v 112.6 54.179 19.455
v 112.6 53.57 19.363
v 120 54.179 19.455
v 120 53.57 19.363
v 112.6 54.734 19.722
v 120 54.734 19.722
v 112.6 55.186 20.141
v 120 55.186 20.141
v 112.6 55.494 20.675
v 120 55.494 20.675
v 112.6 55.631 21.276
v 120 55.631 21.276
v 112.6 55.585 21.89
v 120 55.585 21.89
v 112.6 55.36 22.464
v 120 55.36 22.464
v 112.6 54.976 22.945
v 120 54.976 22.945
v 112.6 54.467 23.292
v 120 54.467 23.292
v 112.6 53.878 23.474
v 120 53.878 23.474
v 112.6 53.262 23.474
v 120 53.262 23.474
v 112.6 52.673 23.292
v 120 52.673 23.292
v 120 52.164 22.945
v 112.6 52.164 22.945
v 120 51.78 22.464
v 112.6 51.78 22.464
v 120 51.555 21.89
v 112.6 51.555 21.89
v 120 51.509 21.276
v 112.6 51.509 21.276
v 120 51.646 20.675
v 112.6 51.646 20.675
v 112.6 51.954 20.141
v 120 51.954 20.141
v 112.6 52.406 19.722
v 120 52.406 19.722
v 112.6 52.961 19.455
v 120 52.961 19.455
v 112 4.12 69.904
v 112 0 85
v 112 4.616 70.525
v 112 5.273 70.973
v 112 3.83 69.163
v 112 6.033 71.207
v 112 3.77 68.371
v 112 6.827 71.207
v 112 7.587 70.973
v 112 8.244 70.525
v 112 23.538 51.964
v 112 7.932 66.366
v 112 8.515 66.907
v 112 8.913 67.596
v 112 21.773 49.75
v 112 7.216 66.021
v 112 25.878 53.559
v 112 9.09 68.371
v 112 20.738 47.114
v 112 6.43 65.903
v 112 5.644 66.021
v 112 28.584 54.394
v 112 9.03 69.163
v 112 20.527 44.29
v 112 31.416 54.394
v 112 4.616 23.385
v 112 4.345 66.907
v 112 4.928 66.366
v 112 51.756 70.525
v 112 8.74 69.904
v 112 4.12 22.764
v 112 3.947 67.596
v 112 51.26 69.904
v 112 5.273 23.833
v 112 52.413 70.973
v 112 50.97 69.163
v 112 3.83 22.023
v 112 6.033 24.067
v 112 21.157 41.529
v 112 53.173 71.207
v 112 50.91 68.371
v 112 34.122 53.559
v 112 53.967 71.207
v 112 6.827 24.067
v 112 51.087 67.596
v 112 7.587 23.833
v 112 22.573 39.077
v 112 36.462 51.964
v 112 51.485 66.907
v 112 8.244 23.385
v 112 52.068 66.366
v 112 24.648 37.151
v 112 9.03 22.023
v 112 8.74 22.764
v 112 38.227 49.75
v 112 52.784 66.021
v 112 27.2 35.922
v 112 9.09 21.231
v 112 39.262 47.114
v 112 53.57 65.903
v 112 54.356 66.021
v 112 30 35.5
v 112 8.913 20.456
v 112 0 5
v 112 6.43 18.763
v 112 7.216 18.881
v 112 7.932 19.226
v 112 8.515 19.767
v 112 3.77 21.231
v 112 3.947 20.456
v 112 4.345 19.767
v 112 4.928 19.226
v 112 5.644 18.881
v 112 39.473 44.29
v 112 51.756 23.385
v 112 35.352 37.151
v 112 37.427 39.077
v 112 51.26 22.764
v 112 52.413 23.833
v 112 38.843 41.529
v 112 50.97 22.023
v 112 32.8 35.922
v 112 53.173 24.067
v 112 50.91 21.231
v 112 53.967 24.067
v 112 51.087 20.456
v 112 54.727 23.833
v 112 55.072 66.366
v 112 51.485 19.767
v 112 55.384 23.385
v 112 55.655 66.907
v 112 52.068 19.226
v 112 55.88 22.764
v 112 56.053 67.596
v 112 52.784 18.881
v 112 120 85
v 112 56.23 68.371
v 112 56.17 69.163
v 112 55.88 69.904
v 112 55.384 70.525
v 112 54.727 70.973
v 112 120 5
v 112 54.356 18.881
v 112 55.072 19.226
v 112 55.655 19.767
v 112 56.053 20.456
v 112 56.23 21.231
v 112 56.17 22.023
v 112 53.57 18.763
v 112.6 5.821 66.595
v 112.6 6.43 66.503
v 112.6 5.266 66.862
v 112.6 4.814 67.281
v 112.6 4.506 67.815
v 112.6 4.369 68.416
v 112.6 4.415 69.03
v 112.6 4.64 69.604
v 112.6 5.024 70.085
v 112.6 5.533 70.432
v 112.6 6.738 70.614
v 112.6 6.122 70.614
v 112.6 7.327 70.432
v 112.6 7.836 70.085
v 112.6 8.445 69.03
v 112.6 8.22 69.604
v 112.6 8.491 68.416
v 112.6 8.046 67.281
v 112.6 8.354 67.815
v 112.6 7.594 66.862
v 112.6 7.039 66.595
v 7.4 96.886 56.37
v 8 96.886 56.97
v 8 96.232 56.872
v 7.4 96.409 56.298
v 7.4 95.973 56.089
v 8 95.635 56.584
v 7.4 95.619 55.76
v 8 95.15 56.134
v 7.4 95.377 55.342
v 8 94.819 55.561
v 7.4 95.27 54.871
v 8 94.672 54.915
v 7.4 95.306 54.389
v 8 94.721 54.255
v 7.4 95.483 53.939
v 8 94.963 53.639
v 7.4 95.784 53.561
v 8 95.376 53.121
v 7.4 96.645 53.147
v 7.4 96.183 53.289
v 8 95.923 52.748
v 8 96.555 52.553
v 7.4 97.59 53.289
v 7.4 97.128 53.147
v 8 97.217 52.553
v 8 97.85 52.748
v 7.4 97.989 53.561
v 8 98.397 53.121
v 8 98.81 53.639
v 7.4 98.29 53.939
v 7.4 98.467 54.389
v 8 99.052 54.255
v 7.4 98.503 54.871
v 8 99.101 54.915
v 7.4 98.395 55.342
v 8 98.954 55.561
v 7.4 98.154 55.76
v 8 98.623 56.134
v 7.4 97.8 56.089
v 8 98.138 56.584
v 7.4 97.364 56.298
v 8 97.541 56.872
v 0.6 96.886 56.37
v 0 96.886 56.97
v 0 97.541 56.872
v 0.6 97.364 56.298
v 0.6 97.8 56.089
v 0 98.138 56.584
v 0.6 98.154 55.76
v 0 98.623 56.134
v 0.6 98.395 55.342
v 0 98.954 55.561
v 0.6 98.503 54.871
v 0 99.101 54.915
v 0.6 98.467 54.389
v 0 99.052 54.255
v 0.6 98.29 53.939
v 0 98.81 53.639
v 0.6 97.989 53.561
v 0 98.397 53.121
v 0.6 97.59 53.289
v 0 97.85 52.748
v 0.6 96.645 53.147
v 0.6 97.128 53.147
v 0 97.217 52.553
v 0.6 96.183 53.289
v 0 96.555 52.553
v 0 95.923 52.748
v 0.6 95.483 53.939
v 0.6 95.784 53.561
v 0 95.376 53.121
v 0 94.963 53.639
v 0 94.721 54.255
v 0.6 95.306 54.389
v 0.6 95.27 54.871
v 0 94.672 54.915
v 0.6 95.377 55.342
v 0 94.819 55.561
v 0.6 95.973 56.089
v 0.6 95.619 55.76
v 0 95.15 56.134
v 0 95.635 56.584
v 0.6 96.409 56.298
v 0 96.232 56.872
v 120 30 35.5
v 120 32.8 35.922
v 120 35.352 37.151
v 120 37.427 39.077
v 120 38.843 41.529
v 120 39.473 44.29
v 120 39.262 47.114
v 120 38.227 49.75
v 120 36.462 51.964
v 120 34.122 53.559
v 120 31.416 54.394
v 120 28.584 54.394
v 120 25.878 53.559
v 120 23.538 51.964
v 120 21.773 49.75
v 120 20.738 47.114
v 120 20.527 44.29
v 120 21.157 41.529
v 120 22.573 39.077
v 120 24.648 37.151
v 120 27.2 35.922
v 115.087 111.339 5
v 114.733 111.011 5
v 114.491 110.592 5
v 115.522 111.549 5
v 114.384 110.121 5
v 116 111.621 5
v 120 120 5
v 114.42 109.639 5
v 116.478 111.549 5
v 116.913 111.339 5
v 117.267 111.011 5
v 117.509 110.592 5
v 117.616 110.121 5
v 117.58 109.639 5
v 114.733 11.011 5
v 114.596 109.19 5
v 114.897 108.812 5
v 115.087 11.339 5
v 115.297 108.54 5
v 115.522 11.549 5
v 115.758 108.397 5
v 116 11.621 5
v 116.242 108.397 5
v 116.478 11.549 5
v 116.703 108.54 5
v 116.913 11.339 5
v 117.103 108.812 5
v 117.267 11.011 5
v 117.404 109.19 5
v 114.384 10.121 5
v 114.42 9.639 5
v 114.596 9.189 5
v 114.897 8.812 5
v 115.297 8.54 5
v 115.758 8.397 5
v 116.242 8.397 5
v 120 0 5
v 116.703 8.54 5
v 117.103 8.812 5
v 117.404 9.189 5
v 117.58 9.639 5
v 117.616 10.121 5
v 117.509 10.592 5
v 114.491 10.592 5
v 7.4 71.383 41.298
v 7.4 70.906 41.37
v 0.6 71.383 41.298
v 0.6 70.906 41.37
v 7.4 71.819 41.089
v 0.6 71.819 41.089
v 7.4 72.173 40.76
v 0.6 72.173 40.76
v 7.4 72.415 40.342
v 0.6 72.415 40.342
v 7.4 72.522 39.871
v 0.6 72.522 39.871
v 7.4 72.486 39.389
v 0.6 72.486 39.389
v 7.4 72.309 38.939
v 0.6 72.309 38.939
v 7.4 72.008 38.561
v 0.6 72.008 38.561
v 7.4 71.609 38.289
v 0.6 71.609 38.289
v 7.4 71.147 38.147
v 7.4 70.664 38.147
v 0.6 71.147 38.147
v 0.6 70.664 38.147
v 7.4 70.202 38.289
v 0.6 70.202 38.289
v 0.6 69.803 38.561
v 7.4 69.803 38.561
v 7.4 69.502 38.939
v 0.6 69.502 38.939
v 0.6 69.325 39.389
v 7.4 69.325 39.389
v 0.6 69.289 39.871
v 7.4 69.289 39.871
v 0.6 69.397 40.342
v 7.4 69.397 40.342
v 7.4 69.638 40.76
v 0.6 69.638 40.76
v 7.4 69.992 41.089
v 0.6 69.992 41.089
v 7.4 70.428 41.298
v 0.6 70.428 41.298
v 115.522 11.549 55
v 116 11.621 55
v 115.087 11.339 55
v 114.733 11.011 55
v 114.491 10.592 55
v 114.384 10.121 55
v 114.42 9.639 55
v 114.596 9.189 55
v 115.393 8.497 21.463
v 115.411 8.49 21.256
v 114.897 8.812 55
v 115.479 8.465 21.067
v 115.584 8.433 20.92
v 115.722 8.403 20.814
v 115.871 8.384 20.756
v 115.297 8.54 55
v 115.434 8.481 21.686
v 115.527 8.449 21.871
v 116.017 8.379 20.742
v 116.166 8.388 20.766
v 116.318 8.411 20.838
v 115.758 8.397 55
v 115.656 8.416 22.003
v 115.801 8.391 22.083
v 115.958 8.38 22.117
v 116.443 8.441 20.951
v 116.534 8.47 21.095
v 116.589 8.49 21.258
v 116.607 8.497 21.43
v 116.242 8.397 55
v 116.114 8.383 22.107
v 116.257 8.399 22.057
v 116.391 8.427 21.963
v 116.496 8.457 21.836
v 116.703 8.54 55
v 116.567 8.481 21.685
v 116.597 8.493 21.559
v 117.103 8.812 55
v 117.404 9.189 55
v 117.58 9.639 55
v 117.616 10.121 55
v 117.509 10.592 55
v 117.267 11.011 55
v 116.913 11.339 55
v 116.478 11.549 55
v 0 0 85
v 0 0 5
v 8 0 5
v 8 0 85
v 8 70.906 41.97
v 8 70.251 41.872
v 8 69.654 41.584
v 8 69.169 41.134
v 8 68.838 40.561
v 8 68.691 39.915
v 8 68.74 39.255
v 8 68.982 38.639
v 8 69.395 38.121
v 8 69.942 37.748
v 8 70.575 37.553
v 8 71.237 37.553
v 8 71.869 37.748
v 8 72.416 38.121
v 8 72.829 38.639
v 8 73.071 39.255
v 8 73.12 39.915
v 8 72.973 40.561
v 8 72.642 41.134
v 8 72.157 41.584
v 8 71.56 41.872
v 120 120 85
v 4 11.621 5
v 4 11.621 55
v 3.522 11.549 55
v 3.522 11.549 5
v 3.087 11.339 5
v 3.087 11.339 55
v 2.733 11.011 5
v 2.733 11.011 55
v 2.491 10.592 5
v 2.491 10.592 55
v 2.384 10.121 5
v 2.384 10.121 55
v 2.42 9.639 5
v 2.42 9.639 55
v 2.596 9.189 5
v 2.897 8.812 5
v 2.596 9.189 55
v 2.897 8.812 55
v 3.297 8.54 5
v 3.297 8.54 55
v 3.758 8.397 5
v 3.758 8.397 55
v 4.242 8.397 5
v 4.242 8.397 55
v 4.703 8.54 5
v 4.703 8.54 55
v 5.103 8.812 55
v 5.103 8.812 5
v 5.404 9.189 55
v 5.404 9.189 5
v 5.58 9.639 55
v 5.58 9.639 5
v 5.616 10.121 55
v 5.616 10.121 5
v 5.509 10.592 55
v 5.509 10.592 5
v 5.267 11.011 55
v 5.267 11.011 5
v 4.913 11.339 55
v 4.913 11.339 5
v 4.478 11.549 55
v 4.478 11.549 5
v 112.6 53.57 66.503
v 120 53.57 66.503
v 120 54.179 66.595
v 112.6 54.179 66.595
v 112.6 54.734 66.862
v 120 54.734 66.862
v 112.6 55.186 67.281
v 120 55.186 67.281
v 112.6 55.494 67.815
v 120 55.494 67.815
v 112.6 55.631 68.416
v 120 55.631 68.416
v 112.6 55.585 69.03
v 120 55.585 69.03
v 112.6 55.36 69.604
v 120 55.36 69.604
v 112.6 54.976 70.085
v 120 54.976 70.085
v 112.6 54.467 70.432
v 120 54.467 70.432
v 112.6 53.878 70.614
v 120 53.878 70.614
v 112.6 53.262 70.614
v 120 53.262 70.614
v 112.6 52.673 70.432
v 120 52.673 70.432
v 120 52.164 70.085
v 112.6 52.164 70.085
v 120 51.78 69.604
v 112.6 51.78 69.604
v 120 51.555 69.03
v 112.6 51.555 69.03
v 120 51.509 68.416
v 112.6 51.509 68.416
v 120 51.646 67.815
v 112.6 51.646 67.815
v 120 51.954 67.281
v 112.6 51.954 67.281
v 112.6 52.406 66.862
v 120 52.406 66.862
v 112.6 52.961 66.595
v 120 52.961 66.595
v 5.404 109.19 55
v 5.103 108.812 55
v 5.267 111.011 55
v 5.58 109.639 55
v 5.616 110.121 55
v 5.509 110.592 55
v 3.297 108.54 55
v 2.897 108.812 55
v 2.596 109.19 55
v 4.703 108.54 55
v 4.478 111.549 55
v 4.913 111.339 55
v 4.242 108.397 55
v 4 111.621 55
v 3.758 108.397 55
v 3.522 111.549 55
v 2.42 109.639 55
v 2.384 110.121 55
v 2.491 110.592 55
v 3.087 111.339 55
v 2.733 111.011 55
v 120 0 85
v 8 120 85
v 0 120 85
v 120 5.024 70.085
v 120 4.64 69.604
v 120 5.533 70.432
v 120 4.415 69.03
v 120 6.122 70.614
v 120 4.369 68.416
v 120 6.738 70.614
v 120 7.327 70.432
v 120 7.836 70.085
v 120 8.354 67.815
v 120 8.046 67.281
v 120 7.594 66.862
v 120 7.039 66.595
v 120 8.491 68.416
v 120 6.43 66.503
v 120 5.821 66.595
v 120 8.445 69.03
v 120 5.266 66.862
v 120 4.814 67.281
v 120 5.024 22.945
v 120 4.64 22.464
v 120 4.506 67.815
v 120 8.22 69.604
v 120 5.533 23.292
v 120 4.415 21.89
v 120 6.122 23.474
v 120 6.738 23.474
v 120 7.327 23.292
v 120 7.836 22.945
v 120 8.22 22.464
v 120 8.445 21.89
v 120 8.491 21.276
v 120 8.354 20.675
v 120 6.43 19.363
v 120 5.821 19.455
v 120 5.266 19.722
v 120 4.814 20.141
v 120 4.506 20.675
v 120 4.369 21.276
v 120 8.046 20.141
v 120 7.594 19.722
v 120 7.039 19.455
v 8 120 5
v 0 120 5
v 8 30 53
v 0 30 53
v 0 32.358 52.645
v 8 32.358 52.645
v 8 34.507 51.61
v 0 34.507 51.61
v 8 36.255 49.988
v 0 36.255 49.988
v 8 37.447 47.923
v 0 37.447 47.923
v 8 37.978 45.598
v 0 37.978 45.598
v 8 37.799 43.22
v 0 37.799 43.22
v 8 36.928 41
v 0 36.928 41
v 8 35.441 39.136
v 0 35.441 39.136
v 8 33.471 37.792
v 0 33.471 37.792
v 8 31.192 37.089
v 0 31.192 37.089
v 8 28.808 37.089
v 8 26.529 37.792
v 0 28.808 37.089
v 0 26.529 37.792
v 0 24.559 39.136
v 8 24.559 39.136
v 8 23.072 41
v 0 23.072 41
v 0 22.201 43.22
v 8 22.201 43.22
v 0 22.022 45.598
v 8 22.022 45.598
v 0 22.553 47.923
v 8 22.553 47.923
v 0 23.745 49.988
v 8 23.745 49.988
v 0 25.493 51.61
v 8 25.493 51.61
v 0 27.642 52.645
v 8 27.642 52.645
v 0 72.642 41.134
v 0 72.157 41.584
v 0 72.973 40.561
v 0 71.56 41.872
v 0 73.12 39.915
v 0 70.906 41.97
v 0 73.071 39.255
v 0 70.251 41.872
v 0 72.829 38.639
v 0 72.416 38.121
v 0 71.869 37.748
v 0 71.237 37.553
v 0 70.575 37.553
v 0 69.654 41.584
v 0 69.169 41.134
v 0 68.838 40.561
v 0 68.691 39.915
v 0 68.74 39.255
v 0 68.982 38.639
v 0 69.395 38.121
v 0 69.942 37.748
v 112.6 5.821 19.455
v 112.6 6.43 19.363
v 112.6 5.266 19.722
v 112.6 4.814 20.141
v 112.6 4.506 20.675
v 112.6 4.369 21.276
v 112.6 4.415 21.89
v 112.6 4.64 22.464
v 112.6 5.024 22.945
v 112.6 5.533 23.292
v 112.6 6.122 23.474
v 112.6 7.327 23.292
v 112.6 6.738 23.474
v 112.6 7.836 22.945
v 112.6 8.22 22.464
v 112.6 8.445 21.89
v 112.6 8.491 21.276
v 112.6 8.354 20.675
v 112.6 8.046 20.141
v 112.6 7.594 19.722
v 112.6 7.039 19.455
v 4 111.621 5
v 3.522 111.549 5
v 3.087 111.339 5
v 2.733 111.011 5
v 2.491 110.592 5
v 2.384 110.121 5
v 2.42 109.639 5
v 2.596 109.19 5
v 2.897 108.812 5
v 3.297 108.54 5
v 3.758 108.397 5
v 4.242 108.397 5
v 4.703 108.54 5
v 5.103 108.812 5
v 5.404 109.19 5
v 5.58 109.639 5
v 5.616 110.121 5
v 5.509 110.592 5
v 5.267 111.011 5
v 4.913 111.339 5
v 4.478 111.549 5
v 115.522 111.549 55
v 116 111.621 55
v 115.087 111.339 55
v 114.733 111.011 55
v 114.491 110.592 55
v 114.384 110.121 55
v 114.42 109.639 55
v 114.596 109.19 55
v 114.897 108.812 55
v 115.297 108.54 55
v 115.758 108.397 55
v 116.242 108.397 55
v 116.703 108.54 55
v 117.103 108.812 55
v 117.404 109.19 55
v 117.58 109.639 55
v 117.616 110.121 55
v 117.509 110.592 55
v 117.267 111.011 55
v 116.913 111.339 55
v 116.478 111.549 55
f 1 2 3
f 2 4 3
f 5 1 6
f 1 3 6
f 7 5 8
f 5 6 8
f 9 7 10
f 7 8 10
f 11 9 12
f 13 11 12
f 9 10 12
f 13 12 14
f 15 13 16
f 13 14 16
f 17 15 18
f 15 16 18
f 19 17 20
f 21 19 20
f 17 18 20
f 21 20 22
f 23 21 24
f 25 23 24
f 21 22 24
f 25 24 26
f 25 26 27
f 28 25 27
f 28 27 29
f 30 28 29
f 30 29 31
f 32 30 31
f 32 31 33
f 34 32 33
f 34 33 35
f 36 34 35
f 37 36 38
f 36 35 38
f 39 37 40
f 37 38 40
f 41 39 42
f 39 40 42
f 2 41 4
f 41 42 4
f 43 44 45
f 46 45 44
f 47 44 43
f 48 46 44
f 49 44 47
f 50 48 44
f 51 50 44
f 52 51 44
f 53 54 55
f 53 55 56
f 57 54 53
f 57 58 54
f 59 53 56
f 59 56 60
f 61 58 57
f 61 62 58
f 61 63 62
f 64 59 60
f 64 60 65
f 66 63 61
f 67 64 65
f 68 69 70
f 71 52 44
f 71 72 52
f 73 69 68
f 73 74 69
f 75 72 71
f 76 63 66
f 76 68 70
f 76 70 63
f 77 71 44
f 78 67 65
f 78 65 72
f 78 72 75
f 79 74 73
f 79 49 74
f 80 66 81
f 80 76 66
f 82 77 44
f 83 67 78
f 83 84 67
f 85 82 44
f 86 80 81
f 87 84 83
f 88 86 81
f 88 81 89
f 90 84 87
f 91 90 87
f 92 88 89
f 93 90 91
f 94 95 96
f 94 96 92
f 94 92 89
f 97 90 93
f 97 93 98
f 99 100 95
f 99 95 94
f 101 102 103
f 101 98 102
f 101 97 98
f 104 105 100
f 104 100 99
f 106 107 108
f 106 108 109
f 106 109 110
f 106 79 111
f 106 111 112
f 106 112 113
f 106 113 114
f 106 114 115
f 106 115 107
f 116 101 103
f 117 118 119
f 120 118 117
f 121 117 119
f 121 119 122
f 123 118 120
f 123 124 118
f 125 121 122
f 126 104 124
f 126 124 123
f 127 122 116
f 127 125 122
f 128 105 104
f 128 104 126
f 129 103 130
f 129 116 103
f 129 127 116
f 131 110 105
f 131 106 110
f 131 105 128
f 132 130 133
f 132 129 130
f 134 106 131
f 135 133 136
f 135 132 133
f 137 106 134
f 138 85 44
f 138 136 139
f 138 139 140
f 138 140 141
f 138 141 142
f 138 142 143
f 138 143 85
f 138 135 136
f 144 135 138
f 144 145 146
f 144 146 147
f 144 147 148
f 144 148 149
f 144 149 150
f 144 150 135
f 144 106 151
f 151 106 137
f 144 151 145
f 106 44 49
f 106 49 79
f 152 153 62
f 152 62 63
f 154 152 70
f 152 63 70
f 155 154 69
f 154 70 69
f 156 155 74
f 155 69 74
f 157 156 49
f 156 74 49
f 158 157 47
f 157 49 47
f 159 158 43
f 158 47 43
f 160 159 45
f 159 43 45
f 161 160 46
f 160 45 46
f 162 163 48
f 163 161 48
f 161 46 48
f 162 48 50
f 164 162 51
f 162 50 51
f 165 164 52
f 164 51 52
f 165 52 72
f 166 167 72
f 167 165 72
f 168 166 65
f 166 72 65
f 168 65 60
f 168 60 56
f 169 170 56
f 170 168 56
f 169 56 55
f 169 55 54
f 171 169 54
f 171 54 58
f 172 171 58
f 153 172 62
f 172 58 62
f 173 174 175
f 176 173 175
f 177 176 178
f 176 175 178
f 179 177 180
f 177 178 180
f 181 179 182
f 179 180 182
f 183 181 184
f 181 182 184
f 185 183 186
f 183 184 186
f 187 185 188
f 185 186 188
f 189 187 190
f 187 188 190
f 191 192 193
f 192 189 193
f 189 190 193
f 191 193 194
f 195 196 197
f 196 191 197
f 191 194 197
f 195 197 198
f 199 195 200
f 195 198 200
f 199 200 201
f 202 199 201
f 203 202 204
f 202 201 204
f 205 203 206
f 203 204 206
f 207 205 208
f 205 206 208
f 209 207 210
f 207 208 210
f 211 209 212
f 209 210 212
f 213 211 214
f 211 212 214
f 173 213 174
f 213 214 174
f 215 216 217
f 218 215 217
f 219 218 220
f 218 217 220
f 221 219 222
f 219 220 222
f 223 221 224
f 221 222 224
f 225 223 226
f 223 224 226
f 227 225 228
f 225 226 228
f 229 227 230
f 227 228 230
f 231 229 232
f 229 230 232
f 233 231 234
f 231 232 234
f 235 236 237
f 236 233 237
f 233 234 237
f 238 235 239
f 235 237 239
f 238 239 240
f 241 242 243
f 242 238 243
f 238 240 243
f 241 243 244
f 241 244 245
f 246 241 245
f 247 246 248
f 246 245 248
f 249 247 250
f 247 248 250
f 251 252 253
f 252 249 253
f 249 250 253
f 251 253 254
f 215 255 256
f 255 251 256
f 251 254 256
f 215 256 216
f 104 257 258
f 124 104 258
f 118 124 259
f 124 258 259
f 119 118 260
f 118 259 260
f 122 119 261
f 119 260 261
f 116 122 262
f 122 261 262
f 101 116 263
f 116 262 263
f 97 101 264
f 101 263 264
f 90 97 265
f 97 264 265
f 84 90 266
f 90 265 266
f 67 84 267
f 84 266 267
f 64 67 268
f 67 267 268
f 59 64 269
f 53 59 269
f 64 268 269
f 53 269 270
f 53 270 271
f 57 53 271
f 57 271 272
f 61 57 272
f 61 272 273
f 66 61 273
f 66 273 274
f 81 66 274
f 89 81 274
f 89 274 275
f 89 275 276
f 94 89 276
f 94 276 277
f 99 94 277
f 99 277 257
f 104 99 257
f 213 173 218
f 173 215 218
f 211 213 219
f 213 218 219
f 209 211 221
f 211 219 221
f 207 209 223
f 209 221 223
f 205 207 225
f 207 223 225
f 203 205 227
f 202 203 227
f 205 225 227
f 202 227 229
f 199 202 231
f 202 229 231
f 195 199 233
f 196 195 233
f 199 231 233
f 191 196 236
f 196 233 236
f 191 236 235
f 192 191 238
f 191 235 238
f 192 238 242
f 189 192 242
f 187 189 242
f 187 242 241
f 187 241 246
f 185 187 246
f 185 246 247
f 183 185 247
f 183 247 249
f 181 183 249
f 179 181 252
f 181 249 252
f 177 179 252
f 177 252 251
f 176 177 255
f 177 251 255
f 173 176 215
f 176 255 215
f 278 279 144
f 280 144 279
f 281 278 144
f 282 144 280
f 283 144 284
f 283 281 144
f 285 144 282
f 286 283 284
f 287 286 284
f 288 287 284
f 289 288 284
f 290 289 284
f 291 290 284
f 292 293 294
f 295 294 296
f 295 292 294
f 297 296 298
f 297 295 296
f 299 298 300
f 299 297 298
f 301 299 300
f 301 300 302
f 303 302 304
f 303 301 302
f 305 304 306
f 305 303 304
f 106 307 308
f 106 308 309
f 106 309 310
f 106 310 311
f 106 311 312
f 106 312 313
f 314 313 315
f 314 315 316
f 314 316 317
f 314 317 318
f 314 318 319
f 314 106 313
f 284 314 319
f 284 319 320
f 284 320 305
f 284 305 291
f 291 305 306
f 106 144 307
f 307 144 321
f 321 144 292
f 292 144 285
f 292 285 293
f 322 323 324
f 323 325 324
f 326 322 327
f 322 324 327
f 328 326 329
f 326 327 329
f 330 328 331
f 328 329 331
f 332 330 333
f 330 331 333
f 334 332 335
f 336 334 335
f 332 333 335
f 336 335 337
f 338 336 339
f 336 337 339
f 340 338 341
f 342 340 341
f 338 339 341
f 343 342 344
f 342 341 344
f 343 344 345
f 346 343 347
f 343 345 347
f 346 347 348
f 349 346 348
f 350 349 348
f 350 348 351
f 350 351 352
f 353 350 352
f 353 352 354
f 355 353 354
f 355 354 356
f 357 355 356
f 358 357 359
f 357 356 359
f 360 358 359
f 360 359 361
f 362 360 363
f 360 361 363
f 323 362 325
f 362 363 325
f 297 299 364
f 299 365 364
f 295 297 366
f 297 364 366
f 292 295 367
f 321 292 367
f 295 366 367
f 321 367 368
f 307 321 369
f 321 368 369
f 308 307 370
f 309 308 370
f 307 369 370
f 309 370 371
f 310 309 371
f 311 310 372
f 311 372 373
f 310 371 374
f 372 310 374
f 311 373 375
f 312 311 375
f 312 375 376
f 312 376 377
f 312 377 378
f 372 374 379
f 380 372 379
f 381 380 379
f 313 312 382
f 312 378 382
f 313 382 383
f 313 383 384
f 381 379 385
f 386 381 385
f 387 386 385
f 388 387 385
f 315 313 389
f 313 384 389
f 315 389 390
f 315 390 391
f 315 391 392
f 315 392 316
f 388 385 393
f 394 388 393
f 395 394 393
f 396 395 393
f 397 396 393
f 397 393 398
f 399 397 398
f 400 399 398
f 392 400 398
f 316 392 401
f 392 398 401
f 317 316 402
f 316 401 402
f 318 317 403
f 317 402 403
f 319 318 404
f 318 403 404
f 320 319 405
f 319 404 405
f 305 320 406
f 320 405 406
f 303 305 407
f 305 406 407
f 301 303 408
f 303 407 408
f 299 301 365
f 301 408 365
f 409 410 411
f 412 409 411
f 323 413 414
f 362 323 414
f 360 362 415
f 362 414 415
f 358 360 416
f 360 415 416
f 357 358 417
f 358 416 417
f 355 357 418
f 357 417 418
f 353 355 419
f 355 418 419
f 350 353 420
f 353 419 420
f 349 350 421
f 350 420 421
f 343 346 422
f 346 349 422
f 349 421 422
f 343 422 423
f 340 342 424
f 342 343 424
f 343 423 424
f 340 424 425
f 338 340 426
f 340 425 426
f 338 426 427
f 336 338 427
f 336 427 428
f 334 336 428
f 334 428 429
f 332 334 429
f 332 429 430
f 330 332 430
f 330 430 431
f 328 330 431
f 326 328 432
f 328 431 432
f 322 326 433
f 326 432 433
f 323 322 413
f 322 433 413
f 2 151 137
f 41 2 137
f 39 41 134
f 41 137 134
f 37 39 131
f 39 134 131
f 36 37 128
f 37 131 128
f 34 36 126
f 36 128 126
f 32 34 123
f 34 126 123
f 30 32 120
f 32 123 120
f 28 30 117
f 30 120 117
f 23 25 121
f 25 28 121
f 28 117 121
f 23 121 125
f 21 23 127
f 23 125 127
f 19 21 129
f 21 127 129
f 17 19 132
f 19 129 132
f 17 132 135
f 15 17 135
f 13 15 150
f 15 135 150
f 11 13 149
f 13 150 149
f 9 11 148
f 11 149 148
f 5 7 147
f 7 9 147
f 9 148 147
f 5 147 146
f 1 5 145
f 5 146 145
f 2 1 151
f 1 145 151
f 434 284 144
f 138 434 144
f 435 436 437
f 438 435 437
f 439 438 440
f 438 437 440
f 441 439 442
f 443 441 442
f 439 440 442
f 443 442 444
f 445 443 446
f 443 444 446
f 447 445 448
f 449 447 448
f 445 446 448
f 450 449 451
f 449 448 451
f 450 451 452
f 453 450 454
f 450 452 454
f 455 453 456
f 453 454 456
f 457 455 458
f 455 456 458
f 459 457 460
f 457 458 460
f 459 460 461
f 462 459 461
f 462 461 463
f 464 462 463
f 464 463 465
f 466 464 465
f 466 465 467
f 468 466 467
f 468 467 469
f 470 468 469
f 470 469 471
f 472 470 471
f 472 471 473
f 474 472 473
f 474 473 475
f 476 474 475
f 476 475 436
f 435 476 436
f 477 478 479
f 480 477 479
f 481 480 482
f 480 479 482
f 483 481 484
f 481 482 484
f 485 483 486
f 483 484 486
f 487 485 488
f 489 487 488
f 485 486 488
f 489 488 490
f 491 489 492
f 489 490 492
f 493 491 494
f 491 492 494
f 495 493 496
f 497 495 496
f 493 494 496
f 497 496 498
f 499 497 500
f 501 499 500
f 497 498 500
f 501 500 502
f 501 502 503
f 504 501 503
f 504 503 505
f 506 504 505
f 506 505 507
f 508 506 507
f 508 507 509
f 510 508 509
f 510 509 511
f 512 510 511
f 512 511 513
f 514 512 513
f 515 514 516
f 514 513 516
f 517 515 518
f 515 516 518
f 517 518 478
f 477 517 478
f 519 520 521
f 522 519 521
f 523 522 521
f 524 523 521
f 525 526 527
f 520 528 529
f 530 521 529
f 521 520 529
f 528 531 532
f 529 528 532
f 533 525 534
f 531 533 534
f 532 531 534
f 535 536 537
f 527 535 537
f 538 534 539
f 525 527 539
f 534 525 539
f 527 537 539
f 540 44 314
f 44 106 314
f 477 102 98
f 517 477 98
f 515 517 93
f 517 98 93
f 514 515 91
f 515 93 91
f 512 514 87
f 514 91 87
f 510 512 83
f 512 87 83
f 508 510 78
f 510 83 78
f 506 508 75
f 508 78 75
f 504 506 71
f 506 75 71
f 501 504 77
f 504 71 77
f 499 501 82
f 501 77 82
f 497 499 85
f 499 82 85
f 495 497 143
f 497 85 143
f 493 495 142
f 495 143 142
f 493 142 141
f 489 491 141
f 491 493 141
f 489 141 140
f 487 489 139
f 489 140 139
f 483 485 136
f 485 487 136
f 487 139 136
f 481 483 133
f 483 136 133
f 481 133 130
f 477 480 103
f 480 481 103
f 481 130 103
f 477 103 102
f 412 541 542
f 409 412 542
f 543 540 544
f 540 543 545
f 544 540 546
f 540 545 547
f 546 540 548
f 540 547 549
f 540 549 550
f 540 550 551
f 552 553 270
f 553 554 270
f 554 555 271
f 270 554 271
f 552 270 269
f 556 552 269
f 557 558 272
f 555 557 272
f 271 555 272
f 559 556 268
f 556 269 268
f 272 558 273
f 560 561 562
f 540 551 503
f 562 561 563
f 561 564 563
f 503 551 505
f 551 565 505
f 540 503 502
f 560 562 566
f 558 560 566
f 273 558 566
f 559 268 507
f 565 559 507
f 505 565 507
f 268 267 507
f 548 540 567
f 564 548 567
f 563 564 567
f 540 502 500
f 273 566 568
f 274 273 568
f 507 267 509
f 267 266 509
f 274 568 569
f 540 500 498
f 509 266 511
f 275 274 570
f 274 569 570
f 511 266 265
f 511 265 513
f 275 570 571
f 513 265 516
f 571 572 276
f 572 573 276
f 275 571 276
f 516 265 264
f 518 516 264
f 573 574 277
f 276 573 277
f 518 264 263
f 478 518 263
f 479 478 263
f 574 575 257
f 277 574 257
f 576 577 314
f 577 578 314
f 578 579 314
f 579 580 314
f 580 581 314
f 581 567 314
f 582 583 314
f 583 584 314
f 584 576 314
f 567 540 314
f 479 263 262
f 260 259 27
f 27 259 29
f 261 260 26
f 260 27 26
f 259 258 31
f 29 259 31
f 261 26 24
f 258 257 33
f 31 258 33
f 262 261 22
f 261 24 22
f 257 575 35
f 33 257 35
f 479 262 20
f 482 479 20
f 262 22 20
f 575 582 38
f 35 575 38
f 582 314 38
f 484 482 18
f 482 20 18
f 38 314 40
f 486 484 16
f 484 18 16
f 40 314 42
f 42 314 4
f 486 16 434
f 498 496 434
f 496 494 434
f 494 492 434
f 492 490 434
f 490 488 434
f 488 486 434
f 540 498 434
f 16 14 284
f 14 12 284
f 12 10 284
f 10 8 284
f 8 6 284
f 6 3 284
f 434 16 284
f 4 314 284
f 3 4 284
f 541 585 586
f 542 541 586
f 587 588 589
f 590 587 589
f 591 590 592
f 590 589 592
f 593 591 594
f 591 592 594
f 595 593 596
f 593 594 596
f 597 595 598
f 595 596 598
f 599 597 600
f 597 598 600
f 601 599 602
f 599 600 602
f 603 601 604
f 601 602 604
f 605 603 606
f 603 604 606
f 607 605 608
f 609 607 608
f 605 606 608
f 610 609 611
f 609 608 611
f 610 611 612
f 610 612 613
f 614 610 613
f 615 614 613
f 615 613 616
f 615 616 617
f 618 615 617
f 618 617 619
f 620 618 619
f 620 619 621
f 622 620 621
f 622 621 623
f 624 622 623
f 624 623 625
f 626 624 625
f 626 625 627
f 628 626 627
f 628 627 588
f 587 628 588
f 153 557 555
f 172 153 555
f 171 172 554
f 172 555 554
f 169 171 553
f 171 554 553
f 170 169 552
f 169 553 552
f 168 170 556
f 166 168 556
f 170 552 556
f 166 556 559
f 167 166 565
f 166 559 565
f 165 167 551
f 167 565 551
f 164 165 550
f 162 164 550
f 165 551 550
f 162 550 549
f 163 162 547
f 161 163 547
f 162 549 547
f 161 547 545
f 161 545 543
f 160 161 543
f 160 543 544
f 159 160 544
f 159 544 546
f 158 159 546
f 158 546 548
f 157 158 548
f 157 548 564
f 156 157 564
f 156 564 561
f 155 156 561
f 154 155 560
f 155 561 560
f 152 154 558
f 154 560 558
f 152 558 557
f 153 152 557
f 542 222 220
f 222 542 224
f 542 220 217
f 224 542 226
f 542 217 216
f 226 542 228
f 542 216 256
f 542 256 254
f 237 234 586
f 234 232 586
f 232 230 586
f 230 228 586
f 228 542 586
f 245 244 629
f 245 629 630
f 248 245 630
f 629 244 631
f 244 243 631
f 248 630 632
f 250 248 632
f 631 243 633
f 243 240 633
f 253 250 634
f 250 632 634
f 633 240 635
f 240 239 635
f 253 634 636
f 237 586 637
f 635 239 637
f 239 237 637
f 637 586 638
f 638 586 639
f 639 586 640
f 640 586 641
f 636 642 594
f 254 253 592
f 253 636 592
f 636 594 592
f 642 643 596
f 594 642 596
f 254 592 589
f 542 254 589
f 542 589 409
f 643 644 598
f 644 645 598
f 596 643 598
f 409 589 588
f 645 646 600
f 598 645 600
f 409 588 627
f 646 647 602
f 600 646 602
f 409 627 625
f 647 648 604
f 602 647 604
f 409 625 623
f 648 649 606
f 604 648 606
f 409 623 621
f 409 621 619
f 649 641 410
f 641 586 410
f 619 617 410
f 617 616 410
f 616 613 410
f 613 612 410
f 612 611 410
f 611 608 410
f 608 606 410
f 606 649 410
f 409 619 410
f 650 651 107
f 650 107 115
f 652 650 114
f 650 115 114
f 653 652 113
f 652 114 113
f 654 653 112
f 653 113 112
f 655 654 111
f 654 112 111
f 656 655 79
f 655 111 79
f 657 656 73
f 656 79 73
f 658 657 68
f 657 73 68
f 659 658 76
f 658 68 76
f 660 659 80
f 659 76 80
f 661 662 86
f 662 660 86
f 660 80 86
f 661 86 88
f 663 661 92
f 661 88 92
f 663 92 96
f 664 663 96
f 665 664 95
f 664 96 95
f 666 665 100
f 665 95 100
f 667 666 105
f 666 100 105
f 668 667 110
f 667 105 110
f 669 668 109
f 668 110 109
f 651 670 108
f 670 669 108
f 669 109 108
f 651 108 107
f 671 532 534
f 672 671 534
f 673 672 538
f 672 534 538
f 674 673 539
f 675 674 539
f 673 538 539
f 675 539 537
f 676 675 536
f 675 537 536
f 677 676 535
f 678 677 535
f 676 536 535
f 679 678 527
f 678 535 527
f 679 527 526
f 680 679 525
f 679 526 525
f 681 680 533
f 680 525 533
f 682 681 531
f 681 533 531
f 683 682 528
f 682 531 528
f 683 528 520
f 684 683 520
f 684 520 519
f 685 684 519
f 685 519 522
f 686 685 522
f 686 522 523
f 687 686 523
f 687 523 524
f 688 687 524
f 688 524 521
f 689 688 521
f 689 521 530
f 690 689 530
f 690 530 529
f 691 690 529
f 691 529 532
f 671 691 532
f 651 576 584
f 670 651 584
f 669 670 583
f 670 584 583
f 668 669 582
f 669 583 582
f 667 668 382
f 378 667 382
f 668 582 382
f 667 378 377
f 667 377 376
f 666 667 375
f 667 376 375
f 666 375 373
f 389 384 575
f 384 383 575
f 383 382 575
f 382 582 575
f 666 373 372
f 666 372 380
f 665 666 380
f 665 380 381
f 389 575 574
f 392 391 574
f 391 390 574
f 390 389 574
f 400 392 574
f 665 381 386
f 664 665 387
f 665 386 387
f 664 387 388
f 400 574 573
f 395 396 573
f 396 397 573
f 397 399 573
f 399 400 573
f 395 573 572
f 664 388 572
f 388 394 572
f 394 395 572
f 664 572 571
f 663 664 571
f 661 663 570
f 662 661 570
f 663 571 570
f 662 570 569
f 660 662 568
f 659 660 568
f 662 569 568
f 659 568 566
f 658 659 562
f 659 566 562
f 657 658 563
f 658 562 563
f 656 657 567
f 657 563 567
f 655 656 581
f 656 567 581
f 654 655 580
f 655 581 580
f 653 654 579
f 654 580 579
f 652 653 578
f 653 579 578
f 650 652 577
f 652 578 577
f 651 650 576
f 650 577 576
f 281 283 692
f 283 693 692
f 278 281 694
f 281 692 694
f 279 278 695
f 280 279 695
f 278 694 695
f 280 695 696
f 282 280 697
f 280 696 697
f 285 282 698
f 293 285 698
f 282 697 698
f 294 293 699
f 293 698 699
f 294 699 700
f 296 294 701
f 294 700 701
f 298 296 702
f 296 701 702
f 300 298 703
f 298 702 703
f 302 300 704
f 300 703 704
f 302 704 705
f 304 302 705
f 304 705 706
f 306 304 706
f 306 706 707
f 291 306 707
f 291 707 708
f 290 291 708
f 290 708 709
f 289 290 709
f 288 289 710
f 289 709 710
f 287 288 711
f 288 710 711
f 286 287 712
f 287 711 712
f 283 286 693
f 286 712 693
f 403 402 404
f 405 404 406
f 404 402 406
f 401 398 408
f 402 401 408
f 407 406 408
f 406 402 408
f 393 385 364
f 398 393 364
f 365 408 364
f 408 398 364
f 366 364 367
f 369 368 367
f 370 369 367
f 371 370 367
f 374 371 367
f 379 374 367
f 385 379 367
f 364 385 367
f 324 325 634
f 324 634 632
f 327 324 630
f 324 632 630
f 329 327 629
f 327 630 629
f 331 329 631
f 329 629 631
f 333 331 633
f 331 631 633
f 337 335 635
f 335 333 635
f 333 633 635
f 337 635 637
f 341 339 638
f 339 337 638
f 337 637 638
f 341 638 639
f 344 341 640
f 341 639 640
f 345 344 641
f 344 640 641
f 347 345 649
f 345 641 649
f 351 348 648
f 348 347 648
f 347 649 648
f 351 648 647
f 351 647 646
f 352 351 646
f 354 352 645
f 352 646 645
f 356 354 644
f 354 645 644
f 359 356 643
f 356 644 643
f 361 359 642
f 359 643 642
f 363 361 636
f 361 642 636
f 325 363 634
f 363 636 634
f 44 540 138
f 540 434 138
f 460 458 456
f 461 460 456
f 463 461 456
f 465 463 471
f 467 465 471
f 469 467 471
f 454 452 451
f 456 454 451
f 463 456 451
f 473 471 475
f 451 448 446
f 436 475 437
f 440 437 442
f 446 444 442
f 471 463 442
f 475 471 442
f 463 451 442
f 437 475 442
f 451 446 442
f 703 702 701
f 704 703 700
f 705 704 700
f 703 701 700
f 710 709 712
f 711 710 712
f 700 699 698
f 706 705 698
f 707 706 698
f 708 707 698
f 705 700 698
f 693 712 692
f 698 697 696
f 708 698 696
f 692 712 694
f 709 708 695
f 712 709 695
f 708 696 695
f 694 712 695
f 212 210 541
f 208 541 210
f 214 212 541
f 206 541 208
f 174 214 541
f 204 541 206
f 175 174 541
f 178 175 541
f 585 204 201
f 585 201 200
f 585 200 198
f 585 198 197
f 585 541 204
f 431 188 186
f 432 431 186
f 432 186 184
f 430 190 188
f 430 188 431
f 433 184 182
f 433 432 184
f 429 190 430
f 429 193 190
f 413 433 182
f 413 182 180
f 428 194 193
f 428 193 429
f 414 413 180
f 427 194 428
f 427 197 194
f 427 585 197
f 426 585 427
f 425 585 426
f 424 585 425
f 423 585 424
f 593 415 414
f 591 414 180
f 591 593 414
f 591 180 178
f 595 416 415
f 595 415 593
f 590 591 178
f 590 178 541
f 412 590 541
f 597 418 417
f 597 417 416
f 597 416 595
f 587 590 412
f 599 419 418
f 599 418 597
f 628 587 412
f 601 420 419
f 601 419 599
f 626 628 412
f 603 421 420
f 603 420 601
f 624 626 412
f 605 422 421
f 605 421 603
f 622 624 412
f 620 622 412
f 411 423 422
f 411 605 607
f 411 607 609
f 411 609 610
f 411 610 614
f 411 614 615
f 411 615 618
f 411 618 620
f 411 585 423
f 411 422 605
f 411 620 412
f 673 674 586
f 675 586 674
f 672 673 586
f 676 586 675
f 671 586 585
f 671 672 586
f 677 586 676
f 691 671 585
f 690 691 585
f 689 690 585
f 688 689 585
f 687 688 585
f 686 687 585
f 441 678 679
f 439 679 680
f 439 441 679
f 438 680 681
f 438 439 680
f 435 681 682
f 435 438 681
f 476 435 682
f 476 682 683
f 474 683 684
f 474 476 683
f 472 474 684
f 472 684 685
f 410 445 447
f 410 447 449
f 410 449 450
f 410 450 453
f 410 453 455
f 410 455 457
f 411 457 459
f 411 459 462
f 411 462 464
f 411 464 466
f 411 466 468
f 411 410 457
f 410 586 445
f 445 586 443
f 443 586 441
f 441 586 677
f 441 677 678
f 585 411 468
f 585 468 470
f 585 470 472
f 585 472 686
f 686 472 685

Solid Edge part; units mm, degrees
sketch "Sketch1" plane through (0, 0, 0) normal (0, 0, 1) x (1, 0, 0)
  line L0 (120, 120) -> (0, 120)
  line L1 (0, 120) -> (0, 0)
  line L2 (0, 0) -> (120, 0)
  line L3 (120, 0) -> (120, 120)
extrude "Protrusion1" add sketch "Sketch1" along normal blind 5
sketch "Sketch2" plane through (60, 20, 5) normal (0, 0, 1) x (1, 0, 0)
  line L0 (52, -20) -> (52, 100)
  line L1 (52, 100) -> (60, 100)
  line L2 (60, 100) -> (60, -20)
  line L3 (60, -20) -> (52, -20)
  line L4 (-52, 100) -> (-52, -20)
  line L5 (-52, -20) -> (-60, -20)
  line L6 (-60, -20) -> (-60, 100)
  line L7 (-60, 100) -> (-52, 100)
  dimension "D1" = 8
  dimension "D2" = 8
extrude "Extrusionsausprägung_2" add sketch "Sketch2" along normal blind 80
hole "Bohrung_1" at (120, 30, 45) direction (-1, 0, 0) diameter 19 end up to next
hole "Hole_2" at (20, 20, 5) direction (0, 0, -1) diameter 4.2 end up to next start chamfer 0.6 start chamfer angle 45
hole "Hole1" at (20, 110, 5) direction (0, 0, -1) diameter 4.2 end up to next start chamfer 0.6 start chamfer angle 45
hole "Hole2" at (40, 110, 5) direction (0, 0, -1) diameter 4.2 end up to next start chamfer 0.6 start chamfer angle 45
hole "Hole3" at (40, 20, 5) direction (0, 0, -1) diameter 4.2 end up to next start chamfer 0.6 start chamfer angle 45
hole "Hole4" at (0, 30, 45) direction (1, 0, 0) diameter 16 end up to next
sketch "Sketch3" plane through (60, 0, 42.5) normal (0, -1, 0) x (1, 0, 0)
  line L0 (-60, -42.5) -> (-60, -37.5)
  line L1 (-60, -37.5) -> (60, -37.5)
  line L2 (60, -37.5) -> (60, -42.5)
  line L3 (60, -42.5) -> (-60, -42.5)
extrude "Cutout1" cut sketch "Sketch3" against normal up to next
hole "Hole_17" at (120, 6.43, 21.43) direction (-1, 0, 0) diameter 4.134 end up to next end chamfer 0.6 end chamfer angle 45 thread major 5 thread length 2
hole "Hole5" at (120, 53.57, 21.43) direction (-1, 0, 0) diameter 4.134 end up to next end chamfer 0.6 end chamfer angle 45 thread major 5 thread length 2
hole "Hole6" at (120, 53.57, 68.57) direction (-1, 0, 0) diameter 4.134 end up to next end chamfer 0.6 end chamfer angle 45 thread major 5 thread length 2
hole "Hole7" at (120, 6.43, 68.57) direction (-1, 0, 0) diameter 4.134 end up to next end chamfer 0.6 end chamfer angle 45 thread major 5 thread length 2
hole "Hole_21" at (4, 10, 5) direction (0, 0, 1) diameter 3.242 depth 50 thread major 4 thread length 2
hole "Hole8" at (4, 110, 5) direction (0, 0, 1) diameter 3.242 depth 50 thread major 4 thread length 2
hole "Hole9" at (116, 10, 5) direction (0, 0, 1) diameter 3.242 depth 50 thread major 4 thread length 2
hole "Hole10" at (116, 110, 5) direction (0, 0, 1) diameter 3.242 depth 50 thread major 4 thread length 2
hole "Hole_27" at (0, 70.9056, 39.7494) direction (1, 0, 0) diameter 3.242 end up to next start chamfer 0.6 start chamfer angle 45 end chamfer 0.6 end chamfer angle 45 thread major 4 thread length 2
hole "Hole11" at (0, 96.8864, 54.7494) direction (1, 0, 0) diameter 3.242 end up to next start chamfer 0.6 start chamfer angle 45 end chamfer 0.6 end chamfer angle 45 thread major 4 thread length 2
